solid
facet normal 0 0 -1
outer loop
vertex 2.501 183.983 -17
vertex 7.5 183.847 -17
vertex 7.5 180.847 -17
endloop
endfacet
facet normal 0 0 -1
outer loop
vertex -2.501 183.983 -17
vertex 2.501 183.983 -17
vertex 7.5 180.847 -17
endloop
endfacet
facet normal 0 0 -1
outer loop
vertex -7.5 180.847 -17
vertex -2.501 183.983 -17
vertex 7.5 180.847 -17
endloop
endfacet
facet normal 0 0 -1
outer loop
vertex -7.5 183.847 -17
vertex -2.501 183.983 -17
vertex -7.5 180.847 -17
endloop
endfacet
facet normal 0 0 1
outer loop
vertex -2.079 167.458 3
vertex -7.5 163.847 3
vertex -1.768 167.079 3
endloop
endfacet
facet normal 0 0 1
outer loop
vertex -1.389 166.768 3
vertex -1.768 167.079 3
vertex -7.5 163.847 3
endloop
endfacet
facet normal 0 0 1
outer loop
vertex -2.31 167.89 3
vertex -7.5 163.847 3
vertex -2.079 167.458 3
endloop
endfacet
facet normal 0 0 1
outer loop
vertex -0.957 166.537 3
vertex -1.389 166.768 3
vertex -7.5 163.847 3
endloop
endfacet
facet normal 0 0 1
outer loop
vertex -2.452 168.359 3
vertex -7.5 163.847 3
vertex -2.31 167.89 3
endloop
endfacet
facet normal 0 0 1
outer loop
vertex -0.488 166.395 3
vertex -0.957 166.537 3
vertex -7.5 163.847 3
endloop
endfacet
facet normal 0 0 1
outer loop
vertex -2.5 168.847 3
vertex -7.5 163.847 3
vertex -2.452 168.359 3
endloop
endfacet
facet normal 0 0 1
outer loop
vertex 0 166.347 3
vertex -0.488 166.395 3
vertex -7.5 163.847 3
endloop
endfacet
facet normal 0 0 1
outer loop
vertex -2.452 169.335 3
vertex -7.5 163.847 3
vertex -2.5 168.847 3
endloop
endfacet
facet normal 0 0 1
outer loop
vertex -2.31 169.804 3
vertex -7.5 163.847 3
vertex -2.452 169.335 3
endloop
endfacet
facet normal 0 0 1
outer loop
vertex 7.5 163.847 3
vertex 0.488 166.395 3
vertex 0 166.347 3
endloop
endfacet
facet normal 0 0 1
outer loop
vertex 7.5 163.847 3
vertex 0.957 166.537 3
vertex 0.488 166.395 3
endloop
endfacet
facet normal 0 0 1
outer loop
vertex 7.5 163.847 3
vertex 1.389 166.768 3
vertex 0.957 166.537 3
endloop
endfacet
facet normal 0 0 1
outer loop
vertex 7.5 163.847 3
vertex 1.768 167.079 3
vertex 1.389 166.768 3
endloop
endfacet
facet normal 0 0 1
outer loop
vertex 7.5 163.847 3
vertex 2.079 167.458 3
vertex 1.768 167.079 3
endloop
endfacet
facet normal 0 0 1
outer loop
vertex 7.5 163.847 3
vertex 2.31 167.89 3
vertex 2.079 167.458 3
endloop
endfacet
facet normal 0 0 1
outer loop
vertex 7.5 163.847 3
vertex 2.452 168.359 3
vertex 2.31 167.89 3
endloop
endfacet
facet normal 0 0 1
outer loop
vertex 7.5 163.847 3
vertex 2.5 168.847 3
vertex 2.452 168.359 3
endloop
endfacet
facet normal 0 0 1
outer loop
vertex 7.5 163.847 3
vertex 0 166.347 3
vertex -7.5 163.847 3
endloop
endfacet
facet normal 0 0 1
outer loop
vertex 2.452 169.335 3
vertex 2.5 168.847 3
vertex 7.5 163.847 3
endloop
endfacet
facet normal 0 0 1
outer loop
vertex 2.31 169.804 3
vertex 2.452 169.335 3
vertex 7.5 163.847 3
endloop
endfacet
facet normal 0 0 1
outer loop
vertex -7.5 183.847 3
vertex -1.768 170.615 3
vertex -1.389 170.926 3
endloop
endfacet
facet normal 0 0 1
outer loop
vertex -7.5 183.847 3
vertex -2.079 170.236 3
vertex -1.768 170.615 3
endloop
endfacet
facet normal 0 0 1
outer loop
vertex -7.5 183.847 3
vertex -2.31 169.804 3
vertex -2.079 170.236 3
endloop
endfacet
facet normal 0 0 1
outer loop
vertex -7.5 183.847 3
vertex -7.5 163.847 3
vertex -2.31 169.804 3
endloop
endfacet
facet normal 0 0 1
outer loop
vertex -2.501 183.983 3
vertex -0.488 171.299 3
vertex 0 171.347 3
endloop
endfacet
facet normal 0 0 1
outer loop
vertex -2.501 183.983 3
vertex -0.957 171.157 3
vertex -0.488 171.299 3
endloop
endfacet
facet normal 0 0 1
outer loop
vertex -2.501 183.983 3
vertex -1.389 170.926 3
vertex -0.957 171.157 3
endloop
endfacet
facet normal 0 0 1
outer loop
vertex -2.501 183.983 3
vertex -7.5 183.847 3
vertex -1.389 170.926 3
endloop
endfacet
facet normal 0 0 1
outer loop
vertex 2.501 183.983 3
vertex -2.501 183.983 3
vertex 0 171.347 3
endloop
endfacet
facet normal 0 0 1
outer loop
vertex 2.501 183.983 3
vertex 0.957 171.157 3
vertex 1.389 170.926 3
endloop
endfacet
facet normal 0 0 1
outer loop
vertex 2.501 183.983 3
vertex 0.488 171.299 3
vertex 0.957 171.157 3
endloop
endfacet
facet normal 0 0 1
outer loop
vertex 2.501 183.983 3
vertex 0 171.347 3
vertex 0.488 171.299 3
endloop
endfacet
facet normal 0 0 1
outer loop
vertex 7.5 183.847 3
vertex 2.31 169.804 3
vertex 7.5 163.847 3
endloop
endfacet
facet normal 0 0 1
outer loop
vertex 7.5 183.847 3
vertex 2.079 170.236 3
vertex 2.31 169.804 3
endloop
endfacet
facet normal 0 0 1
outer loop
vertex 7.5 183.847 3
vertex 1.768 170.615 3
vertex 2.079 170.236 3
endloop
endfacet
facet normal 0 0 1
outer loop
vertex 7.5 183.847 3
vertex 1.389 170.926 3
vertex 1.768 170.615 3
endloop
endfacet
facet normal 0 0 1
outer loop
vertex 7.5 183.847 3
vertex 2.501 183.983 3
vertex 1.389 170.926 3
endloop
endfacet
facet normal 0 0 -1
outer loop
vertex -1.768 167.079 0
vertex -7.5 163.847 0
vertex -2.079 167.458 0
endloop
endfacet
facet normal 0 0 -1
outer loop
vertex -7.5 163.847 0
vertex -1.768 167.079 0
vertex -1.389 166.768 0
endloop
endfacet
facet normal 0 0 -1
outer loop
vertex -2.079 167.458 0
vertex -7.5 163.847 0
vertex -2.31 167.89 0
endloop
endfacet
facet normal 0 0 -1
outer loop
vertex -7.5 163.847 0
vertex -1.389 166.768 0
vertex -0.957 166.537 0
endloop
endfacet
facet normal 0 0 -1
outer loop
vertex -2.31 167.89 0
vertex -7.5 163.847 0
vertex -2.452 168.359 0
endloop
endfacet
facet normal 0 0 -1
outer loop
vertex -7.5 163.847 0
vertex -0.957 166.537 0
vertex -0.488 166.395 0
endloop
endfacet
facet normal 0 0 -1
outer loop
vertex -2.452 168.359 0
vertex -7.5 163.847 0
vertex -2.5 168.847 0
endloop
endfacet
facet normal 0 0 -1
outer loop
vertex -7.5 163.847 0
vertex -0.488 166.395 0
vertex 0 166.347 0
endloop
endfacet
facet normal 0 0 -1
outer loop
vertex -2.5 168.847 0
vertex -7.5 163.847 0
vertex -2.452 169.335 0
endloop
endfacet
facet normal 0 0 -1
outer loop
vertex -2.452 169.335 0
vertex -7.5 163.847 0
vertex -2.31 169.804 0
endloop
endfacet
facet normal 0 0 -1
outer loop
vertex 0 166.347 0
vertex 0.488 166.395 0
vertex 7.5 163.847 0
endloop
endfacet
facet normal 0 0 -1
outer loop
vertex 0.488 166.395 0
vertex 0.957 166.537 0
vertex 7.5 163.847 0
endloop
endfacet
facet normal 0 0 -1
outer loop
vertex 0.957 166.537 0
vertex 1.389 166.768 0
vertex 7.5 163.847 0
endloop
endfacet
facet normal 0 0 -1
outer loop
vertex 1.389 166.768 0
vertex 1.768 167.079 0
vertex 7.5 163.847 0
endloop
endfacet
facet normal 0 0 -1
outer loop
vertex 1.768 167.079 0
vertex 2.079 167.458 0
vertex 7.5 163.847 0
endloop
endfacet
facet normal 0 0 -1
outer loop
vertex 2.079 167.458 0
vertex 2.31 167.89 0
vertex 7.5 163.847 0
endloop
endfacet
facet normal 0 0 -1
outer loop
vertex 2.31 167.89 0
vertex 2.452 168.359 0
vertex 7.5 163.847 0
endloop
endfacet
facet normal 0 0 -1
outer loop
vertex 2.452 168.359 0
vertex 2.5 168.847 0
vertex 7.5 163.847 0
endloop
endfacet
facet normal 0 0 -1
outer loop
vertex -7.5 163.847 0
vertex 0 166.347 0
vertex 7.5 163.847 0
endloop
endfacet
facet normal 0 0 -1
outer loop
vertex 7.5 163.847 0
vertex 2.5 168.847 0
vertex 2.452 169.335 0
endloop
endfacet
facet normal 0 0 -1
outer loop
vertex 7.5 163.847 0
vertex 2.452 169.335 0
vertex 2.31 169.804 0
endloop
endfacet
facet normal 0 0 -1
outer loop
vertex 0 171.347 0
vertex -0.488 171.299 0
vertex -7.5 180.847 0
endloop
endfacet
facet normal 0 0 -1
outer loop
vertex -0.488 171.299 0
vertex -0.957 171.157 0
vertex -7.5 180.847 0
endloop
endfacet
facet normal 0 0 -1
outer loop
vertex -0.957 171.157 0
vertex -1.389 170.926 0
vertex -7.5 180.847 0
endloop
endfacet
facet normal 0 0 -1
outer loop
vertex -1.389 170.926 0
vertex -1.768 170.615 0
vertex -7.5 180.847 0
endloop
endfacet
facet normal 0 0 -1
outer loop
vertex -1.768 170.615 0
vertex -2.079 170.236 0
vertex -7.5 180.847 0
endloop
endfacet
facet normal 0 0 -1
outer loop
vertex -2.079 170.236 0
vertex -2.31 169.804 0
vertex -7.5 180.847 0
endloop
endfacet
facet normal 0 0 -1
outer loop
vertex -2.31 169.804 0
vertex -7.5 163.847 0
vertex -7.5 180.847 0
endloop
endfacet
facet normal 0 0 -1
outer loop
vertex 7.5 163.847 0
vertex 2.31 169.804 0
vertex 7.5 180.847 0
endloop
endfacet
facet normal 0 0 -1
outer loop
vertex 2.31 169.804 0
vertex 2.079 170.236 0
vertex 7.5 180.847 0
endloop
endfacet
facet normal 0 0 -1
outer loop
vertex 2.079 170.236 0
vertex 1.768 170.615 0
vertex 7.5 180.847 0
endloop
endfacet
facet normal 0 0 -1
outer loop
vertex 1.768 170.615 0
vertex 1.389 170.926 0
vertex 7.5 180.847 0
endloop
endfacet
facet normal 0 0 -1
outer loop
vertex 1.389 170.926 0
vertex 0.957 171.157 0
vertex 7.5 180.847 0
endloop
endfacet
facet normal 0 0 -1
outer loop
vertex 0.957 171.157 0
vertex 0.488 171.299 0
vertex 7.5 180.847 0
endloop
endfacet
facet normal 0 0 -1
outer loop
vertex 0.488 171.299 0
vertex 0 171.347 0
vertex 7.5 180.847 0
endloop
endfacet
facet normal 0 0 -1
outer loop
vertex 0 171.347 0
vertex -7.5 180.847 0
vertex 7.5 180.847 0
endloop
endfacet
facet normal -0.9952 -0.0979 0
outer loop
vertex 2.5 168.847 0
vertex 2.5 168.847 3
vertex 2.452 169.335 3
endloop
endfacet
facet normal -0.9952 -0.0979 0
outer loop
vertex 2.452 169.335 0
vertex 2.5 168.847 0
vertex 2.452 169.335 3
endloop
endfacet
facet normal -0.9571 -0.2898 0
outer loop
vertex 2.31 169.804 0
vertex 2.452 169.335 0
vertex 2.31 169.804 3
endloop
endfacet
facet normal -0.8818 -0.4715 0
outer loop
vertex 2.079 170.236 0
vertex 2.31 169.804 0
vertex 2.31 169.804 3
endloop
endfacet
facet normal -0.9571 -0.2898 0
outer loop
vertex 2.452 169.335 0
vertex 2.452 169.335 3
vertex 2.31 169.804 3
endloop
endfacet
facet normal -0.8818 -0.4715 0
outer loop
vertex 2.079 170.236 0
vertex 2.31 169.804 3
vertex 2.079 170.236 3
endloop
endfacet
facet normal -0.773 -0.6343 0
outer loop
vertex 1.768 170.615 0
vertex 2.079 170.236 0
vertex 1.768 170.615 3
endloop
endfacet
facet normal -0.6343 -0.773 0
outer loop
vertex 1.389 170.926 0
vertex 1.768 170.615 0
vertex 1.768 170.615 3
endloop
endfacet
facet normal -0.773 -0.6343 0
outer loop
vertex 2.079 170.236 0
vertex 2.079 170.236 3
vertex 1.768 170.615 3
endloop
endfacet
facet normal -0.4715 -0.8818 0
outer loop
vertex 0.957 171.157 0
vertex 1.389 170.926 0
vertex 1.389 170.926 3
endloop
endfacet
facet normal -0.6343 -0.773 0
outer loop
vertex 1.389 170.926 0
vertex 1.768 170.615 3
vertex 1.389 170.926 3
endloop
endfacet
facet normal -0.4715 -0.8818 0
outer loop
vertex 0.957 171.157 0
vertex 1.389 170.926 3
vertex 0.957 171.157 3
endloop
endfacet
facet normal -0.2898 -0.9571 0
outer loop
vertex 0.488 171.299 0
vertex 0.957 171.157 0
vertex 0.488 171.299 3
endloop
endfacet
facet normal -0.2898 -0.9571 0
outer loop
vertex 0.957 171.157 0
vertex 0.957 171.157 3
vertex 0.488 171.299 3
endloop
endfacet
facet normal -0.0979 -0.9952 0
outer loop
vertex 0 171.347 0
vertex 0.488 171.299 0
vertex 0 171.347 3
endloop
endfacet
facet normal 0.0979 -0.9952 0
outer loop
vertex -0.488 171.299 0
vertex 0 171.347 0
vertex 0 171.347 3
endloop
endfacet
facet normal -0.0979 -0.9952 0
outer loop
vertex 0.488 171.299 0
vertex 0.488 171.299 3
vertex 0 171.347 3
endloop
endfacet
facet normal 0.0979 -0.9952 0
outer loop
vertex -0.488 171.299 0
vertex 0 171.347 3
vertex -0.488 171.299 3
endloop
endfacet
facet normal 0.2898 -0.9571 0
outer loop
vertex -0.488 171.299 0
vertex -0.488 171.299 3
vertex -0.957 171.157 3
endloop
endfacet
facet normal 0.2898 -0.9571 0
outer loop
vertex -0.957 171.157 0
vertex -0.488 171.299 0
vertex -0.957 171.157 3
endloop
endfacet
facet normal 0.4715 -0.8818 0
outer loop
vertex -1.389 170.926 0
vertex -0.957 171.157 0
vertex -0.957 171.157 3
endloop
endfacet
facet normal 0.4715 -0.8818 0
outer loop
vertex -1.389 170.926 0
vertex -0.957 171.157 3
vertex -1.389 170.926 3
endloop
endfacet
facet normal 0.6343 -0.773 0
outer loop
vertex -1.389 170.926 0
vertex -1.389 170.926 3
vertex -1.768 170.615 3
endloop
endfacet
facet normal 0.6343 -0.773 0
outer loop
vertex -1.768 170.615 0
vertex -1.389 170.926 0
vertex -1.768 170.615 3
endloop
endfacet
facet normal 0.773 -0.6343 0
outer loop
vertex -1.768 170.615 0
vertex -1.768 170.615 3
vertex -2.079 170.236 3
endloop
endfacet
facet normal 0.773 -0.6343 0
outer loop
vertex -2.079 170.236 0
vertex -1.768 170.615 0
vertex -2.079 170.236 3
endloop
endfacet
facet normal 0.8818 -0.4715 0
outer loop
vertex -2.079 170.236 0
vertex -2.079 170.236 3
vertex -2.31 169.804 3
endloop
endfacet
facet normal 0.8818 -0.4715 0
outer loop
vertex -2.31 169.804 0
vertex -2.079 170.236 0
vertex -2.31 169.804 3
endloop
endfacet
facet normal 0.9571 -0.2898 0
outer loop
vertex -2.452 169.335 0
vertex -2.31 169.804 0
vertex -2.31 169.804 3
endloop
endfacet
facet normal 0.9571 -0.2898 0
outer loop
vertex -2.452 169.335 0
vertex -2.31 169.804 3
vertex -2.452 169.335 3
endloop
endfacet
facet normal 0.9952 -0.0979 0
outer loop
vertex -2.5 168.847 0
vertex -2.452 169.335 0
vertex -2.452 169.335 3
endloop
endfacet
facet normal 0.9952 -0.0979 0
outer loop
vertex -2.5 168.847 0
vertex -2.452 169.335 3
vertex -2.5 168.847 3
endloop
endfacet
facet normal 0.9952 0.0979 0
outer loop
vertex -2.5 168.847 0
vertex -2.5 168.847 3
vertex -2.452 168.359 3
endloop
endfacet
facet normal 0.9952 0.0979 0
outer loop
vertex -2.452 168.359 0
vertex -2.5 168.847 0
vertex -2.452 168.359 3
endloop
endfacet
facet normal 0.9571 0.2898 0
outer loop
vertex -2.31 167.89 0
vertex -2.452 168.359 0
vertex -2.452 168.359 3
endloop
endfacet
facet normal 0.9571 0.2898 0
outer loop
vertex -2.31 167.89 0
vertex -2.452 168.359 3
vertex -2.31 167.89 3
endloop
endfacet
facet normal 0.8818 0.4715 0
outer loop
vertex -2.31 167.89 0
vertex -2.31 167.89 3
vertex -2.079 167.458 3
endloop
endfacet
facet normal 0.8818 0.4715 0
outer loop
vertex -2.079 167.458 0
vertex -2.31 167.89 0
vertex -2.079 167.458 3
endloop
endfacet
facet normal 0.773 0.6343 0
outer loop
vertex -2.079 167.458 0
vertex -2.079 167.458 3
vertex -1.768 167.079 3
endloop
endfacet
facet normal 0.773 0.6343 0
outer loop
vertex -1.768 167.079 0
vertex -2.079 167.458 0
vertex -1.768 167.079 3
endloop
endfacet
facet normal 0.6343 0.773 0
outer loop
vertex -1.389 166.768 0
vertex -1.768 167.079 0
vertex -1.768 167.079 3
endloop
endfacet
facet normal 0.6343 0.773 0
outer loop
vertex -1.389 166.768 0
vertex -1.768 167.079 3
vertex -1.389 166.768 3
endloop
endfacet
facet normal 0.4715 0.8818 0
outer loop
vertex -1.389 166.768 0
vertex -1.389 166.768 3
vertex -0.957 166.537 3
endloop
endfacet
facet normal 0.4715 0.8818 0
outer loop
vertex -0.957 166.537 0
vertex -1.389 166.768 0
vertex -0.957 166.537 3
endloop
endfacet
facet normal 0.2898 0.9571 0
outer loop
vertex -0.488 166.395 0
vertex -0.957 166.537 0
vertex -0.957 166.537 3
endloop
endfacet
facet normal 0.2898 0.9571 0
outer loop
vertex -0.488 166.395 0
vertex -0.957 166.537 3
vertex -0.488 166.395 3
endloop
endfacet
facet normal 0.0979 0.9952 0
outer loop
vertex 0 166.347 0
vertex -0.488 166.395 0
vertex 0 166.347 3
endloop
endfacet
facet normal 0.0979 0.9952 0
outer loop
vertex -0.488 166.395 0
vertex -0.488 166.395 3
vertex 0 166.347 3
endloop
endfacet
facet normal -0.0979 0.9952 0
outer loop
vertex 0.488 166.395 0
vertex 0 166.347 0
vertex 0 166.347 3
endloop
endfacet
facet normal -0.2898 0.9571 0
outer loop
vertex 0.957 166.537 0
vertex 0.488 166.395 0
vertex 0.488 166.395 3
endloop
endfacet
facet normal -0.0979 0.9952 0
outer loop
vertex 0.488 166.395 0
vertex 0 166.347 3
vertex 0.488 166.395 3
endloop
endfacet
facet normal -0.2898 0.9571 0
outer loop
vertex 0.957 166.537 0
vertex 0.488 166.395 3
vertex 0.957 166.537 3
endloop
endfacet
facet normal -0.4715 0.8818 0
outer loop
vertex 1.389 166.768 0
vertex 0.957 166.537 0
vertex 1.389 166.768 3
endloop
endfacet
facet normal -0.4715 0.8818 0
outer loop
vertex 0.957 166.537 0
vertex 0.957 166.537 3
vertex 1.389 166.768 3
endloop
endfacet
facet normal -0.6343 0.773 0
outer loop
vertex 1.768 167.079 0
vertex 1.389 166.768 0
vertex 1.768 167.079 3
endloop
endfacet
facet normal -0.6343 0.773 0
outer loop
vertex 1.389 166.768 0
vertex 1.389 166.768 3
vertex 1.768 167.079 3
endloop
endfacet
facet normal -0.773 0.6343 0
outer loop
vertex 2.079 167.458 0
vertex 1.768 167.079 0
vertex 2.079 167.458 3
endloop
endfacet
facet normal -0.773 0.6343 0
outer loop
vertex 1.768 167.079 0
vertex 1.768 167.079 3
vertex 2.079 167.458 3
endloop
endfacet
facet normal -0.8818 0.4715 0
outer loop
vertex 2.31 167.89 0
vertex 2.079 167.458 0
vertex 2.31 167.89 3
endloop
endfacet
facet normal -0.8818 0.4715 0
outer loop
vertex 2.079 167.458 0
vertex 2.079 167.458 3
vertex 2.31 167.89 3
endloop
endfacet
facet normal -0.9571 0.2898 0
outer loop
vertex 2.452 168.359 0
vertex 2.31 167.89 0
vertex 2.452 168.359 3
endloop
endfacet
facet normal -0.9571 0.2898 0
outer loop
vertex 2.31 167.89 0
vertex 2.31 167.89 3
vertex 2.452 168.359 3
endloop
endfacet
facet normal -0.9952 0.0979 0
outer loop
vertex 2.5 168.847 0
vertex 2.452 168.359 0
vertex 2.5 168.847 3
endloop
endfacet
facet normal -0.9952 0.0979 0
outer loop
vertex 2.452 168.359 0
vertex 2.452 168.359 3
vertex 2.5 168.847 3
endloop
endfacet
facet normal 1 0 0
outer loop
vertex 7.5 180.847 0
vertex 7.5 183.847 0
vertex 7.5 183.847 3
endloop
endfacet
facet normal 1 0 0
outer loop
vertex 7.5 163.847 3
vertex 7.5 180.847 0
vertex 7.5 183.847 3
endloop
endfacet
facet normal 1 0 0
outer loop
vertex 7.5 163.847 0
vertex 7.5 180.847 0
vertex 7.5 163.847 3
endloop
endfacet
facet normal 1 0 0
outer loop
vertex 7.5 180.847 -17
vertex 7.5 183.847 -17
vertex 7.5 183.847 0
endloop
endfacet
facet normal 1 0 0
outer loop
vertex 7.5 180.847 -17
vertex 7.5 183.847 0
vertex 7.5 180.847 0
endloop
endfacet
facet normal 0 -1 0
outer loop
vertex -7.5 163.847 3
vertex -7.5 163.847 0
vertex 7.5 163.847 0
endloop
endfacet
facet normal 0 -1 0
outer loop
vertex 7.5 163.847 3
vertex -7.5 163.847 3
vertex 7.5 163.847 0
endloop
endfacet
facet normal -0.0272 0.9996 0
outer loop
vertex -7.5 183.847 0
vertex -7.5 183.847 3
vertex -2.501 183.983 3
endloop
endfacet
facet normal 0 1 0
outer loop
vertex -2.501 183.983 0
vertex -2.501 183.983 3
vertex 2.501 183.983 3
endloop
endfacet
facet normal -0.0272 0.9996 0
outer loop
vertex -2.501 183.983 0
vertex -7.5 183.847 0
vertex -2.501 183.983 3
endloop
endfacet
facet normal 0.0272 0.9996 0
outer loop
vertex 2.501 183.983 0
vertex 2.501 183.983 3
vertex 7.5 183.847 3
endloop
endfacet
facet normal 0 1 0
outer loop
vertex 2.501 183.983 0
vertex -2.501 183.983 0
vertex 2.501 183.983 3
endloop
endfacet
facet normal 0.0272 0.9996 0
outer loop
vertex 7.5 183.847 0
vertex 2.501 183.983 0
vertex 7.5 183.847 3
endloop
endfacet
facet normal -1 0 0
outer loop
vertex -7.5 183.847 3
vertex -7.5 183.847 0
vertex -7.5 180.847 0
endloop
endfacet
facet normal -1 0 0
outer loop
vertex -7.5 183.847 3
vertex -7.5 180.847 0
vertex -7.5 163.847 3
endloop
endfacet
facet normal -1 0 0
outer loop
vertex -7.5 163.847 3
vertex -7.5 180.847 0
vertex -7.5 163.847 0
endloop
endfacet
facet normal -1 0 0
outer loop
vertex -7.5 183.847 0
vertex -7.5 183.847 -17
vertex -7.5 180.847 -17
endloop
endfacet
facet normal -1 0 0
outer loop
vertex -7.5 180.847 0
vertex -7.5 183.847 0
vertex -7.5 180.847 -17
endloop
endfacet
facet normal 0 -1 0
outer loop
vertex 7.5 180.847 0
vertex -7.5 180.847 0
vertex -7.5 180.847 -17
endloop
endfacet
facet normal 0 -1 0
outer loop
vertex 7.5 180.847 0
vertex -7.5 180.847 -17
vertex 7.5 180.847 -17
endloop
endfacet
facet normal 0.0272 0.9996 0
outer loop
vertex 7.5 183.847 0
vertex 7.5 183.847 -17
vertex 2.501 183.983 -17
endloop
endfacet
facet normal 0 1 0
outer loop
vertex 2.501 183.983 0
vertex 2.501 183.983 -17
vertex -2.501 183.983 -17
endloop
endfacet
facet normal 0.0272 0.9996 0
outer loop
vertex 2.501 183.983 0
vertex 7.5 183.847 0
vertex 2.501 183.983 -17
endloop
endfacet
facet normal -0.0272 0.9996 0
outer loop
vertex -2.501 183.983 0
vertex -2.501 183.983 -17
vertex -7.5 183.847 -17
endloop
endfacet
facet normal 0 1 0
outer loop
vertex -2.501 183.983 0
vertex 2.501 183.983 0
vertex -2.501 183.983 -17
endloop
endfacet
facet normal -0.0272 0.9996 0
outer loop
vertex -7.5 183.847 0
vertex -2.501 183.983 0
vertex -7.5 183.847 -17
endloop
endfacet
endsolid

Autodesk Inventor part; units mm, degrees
ref_plane "YZ Plane" through (0, 0, 0) normal (1, 0, 0) x (0, 1, 0)
ref_plane "XZ Plane" through (0, 0, 0) normal (0, 1, 0) x (-1, 0, 0)
ref_plane "XY Plane" through (0, 0, 0) normal (0, 0, 1) x (1, 0, 0)
sketch "Skizze5" plane through (0, 0, 0) normal (0, 0, 1) x (1, 0, 0)
  line L0 (-257.6, 0) -> (257.6, 0) projected
  line L1 (0, -257.6) -> (0, 257.6) projected
  circle A0 centre (0, 0) radius 184
  line L2 (0, 0) -> (0, 184)
  line L3 (-7.5, 183.8471) -> (7.5, 183.8471)
  line L4 (-7.5, 183.8471) -> (-7.5, 163.8471)
  line L5 (7.5, 183.8471) -> (7.5, 163.8471)
  line L6 (-7.5, 163.8471) -> (7.5, 163.8471)
  dimension "d14" = 368
  dimension "d15" = 15
  dimension "d16" = 20
  dimension "d17" = 20
extrude "Extrusion3" add sketch "Skizze5" along normal blind 3 contours L6 L4 L3 L1 | L1 L3 L5 L6 | L3 L1 A0 | A0 L1 L3
sketch "Skizze6" plane through (0, 0, 0) normal (0, 0, -1) x (-1, 0, 0)
  line L0 (-7.5, 163.8471) -> (-7.5, 183.8471) projected
  arc A0 (7.5, 183.8471) -> (-7.5, 183.8471) centre (0, 0) ccw projected
  arc A1 (-7.5, 183.8471) -> (0, 184) centre (0, 0) ccw
  line L1 (-7.5, 183.8471) -> (7.5, 183.8471)
  line L2 (7.5, 183.8471) -> (7.5, 180.8471)
  line L3 (7.5, 180.8471) -> (-7.5, 180.8471)
  line L4 (-7.5, 180.8471) -> (-7.5, 183.8471)
  point P0 (7.5, 183.8471)
  point P1 (-7.5, 180.8471)
  dimension "d20" = 3
extrude "Extrusion4" add sketch "Skizze6" along normal blind 17 contours L0 L1 L2 L3 | A0 L1
sketch "Skizze7" plane through (0, 0, 3) normal (0, 0, 1) x (1, 0, 0)
  line L0 (-7.5, 163.8471) -> (7.5, 163.8471) projected
  circle A0 centre (0, 168.8471) radius 2.5
  point P0 (0, 0)
  dimension "d23" = 5
  dimension "d24" = 5
extrude "Extrusion5" cut sketch "Skizze7" against normal blind 17
properties part number "WinkelVentilator"
